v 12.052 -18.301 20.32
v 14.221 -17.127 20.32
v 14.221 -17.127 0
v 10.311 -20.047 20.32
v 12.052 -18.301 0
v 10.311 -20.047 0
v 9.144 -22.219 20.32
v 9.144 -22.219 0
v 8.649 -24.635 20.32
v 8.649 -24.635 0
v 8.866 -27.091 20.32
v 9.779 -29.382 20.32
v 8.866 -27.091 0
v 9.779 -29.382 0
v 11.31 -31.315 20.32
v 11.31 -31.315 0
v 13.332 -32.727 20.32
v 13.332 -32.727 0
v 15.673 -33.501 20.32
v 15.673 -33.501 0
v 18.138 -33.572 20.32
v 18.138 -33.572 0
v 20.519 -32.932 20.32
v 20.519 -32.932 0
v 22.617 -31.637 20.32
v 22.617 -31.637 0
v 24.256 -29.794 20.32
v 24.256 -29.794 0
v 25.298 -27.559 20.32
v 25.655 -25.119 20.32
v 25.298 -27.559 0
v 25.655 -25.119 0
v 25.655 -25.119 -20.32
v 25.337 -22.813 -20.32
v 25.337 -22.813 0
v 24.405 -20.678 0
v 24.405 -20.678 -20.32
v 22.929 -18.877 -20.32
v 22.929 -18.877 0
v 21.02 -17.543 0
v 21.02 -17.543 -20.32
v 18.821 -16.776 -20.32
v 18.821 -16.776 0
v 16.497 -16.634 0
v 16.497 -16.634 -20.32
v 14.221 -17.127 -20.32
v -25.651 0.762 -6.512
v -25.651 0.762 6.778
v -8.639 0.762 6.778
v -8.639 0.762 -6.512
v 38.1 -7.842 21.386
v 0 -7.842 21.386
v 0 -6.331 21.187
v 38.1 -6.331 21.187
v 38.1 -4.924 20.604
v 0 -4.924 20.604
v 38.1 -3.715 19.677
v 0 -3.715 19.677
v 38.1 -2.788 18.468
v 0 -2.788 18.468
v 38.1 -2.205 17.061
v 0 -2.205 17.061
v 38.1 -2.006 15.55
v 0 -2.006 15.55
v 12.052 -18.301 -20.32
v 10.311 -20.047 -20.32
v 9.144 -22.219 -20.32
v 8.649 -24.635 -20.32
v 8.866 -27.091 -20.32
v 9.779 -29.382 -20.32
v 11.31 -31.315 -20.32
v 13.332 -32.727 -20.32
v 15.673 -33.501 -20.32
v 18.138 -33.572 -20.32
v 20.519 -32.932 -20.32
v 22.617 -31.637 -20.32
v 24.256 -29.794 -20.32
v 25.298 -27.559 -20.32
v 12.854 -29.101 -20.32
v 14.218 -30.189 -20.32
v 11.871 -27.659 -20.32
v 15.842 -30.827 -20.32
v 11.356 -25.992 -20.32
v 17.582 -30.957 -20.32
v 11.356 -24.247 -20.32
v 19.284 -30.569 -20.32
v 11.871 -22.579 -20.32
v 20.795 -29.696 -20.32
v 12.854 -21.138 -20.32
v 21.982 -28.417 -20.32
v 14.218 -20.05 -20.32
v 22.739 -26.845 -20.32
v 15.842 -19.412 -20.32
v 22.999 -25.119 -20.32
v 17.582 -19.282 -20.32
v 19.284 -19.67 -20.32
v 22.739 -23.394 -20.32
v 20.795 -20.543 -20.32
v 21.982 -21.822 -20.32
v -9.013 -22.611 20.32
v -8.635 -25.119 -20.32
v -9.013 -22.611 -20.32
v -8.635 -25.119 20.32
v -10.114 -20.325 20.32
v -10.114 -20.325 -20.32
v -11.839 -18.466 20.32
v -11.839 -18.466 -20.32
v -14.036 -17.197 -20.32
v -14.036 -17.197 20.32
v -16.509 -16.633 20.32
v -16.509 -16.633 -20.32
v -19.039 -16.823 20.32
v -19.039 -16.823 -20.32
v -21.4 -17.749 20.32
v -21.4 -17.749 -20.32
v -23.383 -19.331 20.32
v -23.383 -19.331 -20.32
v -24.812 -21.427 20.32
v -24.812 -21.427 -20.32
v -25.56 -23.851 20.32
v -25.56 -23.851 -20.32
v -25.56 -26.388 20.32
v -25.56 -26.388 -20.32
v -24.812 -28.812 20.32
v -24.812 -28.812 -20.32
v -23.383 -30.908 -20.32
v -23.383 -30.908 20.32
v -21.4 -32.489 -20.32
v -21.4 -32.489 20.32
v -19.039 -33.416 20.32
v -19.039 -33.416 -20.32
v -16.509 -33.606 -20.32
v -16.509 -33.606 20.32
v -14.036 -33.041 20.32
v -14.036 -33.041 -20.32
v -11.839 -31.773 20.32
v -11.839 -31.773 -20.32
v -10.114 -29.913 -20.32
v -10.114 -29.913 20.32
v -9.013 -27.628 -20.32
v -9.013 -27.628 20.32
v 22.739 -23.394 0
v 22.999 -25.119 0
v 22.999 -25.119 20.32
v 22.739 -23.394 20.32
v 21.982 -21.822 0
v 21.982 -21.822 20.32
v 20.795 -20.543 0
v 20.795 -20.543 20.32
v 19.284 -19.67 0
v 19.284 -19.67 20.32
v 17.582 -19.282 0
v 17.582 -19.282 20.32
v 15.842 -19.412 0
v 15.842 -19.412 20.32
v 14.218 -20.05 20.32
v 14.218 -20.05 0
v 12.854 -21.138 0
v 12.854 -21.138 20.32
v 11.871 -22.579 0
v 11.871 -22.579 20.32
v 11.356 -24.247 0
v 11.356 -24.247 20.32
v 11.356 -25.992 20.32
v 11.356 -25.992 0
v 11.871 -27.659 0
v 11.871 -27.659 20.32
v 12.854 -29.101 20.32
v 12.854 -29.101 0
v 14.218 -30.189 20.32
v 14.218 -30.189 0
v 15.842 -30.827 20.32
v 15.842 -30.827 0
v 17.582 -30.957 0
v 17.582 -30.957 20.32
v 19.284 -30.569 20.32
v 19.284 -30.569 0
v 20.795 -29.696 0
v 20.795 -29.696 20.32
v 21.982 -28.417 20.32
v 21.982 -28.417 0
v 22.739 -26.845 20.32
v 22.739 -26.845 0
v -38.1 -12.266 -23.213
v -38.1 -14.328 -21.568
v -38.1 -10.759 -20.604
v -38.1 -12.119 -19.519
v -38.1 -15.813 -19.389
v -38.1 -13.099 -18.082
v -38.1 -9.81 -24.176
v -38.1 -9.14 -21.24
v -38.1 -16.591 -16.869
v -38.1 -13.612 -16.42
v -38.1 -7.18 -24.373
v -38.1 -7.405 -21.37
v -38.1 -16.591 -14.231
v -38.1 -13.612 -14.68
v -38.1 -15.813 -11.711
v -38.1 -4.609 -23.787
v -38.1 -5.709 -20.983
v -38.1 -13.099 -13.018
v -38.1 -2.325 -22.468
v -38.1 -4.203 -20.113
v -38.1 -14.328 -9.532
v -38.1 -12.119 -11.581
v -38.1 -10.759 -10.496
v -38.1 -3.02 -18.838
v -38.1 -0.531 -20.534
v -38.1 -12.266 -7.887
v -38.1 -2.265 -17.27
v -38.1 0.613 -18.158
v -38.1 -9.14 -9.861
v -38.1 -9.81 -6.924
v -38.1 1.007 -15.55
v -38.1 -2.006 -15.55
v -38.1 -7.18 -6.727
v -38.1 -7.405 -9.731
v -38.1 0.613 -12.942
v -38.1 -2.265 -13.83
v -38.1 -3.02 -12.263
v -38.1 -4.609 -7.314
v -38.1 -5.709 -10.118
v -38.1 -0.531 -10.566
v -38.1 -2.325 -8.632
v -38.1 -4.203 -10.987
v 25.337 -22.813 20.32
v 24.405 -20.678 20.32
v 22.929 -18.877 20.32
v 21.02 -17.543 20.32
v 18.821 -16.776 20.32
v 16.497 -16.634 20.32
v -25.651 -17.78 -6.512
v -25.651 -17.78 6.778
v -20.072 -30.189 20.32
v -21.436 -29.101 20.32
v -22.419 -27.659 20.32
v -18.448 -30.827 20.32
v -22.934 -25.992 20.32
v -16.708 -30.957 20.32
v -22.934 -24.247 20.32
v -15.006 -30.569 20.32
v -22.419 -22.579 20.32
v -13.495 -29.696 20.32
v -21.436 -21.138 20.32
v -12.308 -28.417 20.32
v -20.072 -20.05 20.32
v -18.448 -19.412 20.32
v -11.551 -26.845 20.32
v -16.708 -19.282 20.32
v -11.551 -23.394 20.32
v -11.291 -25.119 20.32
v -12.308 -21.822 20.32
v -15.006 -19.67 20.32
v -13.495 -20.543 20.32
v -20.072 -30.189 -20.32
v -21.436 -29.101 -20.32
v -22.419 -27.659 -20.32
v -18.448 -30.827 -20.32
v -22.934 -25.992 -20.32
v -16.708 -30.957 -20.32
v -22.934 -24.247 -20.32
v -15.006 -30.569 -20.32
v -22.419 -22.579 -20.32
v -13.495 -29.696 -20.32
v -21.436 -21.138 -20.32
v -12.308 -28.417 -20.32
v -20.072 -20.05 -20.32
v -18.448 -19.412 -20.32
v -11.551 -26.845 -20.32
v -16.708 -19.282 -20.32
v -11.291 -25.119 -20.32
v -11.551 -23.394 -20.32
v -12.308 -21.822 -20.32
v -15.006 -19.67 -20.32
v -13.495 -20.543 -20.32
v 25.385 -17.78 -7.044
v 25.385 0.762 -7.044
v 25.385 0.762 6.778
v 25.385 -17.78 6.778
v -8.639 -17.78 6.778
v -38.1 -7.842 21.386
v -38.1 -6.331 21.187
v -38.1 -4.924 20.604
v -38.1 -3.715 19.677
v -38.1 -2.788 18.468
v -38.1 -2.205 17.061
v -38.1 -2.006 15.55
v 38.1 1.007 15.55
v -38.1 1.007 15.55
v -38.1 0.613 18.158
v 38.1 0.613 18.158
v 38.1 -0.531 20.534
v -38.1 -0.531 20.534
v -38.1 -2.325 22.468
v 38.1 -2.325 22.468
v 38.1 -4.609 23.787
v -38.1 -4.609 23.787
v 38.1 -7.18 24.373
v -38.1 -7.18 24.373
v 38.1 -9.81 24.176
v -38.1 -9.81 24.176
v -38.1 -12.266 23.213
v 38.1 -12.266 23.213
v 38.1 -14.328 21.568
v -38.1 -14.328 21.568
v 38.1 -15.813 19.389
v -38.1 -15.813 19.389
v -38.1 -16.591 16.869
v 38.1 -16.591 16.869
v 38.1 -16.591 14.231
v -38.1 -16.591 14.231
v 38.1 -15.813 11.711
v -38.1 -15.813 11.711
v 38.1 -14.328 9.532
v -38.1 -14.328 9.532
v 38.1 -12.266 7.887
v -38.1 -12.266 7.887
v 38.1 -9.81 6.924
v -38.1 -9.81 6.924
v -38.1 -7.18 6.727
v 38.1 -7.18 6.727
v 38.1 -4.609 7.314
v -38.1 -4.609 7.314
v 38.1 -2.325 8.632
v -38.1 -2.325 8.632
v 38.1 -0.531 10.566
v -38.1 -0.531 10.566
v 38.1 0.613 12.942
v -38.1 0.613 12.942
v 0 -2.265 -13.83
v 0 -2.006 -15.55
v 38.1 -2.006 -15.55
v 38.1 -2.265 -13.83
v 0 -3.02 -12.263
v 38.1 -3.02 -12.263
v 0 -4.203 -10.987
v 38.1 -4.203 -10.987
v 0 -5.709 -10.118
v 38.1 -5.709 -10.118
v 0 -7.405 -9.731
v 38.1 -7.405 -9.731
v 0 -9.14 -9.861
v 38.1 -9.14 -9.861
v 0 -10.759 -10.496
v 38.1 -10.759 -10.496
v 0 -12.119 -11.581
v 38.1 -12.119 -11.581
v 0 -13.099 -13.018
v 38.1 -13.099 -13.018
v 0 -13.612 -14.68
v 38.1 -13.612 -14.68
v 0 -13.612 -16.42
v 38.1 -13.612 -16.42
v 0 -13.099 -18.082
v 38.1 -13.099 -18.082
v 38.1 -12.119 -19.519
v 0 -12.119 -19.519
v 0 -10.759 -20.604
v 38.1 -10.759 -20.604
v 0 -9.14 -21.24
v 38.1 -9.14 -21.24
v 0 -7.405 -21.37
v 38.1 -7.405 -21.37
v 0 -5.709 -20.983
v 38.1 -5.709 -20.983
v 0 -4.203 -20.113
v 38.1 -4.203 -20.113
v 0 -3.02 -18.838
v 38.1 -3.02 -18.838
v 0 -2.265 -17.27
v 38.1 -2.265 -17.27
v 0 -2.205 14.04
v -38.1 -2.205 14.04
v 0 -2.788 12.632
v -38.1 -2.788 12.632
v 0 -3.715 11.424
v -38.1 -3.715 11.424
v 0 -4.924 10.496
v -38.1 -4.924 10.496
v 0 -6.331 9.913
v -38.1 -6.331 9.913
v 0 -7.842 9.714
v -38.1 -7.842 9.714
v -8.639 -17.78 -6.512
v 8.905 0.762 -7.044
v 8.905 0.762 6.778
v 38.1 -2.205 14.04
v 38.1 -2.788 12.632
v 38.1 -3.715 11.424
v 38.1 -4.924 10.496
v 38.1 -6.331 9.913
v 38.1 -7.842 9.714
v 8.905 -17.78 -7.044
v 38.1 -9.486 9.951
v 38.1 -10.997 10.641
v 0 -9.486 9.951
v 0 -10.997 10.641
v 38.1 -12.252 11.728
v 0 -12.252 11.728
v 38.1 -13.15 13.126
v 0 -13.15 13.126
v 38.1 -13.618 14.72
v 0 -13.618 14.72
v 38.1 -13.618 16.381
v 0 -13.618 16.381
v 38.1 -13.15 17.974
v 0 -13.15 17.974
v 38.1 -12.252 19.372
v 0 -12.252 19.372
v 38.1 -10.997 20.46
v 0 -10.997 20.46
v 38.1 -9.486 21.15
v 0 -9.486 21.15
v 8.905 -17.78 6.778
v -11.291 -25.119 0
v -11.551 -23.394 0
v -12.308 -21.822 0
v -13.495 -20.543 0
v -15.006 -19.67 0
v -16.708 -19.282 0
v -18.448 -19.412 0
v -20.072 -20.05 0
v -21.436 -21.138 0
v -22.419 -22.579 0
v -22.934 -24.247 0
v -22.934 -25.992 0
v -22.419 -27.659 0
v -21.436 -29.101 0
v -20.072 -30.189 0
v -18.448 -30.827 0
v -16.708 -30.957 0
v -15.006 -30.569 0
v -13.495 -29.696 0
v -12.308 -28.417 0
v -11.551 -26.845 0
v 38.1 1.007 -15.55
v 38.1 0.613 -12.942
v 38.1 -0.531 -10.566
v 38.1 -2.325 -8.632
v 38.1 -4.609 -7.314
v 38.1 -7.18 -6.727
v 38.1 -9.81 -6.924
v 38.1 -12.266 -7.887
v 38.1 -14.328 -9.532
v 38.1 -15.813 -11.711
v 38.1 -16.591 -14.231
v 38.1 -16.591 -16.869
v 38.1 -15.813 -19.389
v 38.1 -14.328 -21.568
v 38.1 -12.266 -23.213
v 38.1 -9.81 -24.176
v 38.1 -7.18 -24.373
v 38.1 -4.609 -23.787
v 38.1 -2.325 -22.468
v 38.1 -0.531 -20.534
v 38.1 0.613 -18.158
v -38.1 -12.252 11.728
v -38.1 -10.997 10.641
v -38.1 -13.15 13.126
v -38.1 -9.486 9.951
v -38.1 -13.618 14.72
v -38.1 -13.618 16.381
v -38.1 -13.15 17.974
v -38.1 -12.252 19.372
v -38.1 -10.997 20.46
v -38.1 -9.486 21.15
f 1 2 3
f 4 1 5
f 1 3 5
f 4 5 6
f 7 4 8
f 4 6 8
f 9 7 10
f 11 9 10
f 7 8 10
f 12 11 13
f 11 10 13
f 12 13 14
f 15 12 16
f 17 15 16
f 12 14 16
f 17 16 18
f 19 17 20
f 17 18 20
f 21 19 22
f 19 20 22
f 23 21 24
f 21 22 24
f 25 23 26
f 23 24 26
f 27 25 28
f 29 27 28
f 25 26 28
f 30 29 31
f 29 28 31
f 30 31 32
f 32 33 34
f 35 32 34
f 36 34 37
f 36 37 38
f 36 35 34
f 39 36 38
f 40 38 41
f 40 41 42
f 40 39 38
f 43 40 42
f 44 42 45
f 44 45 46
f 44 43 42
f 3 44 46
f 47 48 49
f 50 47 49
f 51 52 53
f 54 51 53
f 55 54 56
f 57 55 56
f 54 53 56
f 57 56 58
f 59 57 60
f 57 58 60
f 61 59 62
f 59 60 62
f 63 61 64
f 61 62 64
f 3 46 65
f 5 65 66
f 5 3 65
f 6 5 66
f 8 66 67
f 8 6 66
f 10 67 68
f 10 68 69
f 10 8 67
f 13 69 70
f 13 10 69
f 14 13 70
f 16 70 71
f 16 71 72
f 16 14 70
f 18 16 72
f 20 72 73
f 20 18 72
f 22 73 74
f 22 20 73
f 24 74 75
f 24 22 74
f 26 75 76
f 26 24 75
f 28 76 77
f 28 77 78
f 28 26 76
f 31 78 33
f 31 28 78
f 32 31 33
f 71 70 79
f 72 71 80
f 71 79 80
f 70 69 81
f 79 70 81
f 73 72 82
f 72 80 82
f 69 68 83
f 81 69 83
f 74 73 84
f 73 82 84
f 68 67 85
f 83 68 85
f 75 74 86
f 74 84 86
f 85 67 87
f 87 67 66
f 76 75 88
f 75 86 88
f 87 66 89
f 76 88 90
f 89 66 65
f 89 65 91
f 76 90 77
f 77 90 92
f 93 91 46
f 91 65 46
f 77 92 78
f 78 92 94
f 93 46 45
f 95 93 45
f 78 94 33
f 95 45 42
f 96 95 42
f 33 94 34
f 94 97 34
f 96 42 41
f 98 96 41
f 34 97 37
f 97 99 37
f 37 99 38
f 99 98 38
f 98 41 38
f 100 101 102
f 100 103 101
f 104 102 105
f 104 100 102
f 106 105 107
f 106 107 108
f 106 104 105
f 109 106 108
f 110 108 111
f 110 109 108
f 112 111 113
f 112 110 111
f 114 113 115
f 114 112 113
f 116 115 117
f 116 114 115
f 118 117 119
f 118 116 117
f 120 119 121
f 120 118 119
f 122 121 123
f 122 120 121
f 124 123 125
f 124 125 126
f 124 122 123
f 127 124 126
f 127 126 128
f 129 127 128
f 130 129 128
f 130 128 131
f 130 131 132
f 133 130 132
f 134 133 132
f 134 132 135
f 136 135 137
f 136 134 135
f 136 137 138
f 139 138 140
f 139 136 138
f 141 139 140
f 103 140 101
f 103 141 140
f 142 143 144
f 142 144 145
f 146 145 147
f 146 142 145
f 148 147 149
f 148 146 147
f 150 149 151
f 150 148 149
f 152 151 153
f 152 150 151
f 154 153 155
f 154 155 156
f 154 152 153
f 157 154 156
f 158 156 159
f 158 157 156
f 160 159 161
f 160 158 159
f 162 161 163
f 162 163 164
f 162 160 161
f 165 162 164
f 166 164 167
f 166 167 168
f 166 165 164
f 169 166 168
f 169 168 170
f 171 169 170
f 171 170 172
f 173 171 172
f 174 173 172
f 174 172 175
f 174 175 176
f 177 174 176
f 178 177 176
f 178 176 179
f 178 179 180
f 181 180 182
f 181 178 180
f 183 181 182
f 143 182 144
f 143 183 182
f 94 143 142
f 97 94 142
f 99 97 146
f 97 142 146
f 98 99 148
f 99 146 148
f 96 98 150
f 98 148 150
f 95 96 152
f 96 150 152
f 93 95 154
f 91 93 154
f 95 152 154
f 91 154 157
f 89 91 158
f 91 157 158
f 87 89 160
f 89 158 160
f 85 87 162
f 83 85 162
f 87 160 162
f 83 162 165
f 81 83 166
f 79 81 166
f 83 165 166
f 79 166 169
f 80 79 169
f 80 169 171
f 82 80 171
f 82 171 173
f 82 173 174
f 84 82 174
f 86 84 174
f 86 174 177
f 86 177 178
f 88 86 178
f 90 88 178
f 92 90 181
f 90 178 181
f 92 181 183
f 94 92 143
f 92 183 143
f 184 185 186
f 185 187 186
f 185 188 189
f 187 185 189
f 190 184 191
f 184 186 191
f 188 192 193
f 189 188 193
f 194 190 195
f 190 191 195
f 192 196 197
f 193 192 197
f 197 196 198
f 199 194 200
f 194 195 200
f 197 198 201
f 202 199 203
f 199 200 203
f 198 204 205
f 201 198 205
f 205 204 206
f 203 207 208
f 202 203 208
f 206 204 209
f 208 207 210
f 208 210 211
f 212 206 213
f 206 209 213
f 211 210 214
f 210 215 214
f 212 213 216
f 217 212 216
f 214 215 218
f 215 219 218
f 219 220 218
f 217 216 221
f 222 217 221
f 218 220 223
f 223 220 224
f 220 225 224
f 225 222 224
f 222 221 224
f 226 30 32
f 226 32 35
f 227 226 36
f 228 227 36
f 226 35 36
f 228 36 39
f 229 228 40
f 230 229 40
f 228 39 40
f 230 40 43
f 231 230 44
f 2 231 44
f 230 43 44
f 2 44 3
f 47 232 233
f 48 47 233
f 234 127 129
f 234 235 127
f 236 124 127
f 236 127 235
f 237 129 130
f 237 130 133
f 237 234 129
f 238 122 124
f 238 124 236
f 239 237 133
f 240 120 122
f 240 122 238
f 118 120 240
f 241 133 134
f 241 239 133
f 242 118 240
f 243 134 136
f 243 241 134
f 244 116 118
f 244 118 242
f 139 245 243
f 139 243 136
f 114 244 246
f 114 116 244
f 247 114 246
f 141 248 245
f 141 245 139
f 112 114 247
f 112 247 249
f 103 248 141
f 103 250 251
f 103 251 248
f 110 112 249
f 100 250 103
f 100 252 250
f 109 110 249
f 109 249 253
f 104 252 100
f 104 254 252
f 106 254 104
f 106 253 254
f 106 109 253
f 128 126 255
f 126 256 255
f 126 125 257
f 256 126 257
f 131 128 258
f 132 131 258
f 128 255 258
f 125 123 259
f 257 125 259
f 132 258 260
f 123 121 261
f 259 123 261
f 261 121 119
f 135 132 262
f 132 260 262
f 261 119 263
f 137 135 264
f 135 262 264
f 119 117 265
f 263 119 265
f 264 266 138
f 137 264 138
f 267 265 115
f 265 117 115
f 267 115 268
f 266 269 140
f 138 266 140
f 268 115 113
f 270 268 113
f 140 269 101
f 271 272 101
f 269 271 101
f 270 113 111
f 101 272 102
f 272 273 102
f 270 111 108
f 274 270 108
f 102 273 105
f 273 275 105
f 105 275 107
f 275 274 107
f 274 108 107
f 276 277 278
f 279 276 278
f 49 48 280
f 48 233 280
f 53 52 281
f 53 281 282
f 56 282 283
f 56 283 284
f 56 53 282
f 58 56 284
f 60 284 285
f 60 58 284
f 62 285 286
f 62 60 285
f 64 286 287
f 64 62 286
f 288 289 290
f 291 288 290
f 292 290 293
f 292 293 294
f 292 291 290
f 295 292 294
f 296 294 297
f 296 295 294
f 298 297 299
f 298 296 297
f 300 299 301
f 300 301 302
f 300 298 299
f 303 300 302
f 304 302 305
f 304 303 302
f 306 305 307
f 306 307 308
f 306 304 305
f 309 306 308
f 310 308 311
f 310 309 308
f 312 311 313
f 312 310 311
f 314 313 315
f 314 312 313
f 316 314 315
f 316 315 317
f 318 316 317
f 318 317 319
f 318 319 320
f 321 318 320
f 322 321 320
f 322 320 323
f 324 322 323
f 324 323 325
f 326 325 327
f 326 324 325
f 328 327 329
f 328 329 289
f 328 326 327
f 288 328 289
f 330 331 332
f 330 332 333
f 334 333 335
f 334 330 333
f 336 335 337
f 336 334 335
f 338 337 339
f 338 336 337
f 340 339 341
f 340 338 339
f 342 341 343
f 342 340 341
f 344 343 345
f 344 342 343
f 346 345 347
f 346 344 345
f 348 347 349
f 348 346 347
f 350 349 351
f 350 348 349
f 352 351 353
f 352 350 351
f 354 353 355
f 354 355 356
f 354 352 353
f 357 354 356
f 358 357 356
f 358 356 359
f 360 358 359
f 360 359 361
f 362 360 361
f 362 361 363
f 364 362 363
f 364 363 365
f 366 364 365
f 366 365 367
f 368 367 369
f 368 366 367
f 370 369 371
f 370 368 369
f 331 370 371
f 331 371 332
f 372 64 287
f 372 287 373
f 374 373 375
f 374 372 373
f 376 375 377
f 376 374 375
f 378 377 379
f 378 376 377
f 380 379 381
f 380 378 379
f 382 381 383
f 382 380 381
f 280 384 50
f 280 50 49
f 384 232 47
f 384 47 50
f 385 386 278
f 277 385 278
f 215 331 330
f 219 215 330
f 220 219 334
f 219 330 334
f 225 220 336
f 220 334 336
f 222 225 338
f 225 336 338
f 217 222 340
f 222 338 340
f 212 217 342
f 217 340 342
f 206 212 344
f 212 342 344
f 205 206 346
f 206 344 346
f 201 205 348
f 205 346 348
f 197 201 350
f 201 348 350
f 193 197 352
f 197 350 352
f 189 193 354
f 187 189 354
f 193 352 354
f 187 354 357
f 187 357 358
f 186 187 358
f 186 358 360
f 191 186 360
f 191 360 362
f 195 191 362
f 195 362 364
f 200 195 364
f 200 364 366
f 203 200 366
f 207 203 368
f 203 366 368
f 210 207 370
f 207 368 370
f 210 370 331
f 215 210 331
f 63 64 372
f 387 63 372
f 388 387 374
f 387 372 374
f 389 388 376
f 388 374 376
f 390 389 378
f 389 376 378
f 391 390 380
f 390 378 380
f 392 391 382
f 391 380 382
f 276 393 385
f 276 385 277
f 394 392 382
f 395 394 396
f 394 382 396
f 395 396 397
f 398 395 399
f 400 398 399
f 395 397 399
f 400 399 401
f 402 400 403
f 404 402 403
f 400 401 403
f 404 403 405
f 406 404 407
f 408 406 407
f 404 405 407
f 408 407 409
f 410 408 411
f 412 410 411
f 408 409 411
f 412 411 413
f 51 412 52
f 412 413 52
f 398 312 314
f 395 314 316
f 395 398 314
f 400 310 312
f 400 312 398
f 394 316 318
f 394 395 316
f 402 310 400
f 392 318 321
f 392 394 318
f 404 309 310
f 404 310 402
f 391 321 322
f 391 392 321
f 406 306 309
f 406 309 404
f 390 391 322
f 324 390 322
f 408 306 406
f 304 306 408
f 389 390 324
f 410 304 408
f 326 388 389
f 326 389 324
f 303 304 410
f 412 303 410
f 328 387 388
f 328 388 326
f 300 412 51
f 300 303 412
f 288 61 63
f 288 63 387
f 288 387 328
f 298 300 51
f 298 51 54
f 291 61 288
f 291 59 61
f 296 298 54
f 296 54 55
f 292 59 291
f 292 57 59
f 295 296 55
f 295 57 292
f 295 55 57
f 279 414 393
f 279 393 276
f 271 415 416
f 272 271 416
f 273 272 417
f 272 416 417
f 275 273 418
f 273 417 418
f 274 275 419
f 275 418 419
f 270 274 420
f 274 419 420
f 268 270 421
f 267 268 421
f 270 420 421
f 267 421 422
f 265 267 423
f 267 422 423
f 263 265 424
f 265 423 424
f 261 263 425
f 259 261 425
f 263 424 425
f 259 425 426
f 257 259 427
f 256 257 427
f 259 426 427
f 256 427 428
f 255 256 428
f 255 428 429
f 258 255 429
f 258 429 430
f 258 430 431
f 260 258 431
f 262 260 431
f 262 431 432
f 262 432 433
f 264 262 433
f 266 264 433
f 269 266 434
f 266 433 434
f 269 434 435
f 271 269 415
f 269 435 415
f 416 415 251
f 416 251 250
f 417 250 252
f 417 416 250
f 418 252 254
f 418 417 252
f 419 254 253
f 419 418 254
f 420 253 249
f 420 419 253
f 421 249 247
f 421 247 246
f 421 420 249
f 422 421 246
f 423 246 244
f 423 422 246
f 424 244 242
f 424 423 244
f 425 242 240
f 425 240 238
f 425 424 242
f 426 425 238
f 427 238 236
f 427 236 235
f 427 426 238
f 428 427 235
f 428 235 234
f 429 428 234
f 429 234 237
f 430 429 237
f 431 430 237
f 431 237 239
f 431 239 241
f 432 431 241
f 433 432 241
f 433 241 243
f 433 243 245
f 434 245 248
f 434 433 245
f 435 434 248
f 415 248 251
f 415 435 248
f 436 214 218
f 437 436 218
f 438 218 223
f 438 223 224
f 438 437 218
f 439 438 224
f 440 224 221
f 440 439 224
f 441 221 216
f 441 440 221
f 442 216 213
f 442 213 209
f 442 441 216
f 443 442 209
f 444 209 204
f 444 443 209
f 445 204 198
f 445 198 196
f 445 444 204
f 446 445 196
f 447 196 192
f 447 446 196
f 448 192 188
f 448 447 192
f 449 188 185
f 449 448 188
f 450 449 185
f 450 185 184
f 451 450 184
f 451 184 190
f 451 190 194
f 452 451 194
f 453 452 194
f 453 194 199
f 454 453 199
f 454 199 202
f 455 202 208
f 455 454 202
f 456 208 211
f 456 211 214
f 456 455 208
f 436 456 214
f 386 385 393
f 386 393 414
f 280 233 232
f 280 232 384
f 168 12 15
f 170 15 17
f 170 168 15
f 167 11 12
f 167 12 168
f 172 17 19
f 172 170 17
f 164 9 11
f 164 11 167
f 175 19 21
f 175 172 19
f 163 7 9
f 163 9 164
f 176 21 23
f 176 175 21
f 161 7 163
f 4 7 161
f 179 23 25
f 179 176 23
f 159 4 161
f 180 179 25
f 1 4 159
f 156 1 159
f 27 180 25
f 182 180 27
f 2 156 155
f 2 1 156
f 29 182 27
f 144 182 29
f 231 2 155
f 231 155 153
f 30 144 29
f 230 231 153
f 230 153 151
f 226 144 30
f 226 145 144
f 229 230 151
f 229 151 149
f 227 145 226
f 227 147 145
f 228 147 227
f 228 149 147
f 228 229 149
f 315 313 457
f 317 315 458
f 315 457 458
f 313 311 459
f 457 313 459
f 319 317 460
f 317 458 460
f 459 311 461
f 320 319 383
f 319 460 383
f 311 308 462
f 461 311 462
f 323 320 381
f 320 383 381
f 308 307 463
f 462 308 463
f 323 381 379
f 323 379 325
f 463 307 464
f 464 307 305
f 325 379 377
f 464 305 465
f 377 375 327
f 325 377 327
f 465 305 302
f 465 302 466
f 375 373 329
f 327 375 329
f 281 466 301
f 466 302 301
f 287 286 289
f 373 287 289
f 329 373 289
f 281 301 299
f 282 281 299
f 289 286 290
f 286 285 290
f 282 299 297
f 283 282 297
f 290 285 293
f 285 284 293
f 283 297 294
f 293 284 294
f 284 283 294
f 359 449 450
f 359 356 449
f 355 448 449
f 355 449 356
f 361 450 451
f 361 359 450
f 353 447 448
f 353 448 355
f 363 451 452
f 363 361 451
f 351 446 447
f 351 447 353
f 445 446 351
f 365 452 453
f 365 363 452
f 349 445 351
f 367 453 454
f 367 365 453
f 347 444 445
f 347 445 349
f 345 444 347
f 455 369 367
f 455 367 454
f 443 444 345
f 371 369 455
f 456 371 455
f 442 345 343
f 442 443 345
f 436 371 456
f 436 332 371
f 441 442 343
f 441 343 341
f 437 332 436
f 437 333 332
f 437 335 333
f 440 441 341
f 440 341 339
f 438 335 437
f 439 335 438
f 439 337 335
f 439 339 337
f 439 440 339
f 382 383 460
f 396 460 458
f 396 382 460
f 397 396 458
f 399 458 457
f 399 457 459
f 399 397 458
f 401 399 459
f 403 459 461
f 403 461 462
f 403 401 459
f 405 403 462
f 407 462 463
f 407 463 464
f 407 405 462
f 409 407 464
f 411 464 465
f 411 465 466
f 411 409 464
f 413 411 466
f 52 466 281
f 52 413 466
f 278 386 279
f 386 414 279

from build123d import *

# Parameters (mm, degrees)
F2_R          = 8.8480516112
F3_DEPTH      = 38.1
F3_DEPTH_BACK = 38.1
F2_R_2        = 5.8358111442
F4_R          = 8.5101971468
F4_R_2        = 5.8539450754
F5_DEPTH      = 20.32
F5_DEPTH_BACK = 20.32
F6_W          = 16.4804635569
F6_H          = 13.8223250397
F7_DEPTH      = 17.78
F7_DEPTH_BACK = 0.762
F6_W_2        = 17.0120932162
F6_H_2        = 13.2906967774


# Not quite as in the source:
# - the program builds the solid bodies; features that only make, move or delete a surface that nothing else refers to are left out


with BuildPart() as f3:
    # F2 (on Right) → F3 (new body, two sides)
    with BuildSketch(Plane.YZ) as f3_sk:
        with Locations((-7.8415106982, 15.5501165427)):
            Circle(F2_R)
        with BuildLine():
            ThreePointArc((-7.8415106982, 21.3859276869), (-3.7149690644, 19.6766581765), (-2.005699554, 15.5501165427))
            ThreePointArc((-2.005699554, 15.5501165427), (-3.7149690644, 11.4235749089), (-7.8415106982, 9.7143053985))
            ThreePointArc((-7.8415106982, 9.7143053985), (-13.6773218424, 15.5501165427), (-7.8415106982, 21.3859276869))
        make_face(mode=Mode.SUBTRACT)
    extrude(amount=F3_DEPTH)
    extrude(f3_sk.sketch, amount=-F3_DEPTH_BACK)


with BuildPart() as f3b:
    # F2 (on Right) → F3, piece 2 (new body, two sides)
    with BuildSketch(Plane.YZ) as f3_2_sk:
        with Locations((-7.8415106982, -15.5501165427)):
            Circle(F2_R)
        with Locations((-7.8415106982, -15.5501165427)):
            Circle(F2_R_2, mode=Mode.SUBTRACT)
    extrude(amount=F3_DEPTH)
    extrude(f3_2_sk.sketch, amount=-F3_DEPTH_BACK)


with BuildPart() as f5:
    # F4 (on Top) → F5 (new body, two sides)
    with BuildSketch(Plane.XY) as f5_sk:
        with Locations((-17.1450003982, -25.1194182783)):
            Circle(F4_R)
        with Locations((-17.1450003982, -25.1194182783)):
            Circle(F4_R_2, mode=Mode.SUBTRACT)
    extrude(amount=F5_DEPTH)
    extrude(f5_sk.sketch, amount=-F5_DEPTH_BACK)


with BuildPart() as f5b:
    # F4 (on Top) → F5, piece 2 (new body, two sides)
    with BuildSketch(Plane.XY) as f5_2_sk:
        with BuildLine():
            ThreePointArc((14.2210470513, -17.1273001421), (12.2695498524, -32.094619885), (25.655197545, -25.1194182783))
            ThreePointArc((25.655197545, -25.1194182783), (22.0204509439, -18.1442166716), (14.2210470513, -17.1273001421))
        make_face()
        with Locations((17.1450003982, -25.1194182783)):
            Circle(F4_R_2, mode=Mode.SUBTRACT)
    extrude(amount=F5_DEPTH)
    extrude(f5_2_sk.sketch, amount=-F5_DEPTH_BACK)


with BuildPart() as f7:
    # F6 (on Front) → F7 (new body, two sides)
    with BuildSketch(Plane.XZ) as f7_sk:
        with Locations((17.1449990012, -0.1329074148)):
            Rectangle(F6_W, F6_H)
    extrude(amount=F7_DEPTH)
    extrude(f7_sk.sketch, amount=-F7_DEPTH_BACK)


with BuildPart() as f7b:
    # F6 (on Front) → F7, piece 2 (new body, two sides)
    with BuildSketch(Plane.XZ) as f7_2_sk:
        with Locations((-17.1450003982, 0.1329067163)):
            Rectangle(F6_W_2, F6_H_2)
    extrude(amount=F7_DEPTH)
    extrude(f7_2_sk.sketch, amount=-F7_DEPTH_BACK)


solid = Compound([f3.part, f3b.part, f5.part, f5b.part, f7.part, f7b.part])
